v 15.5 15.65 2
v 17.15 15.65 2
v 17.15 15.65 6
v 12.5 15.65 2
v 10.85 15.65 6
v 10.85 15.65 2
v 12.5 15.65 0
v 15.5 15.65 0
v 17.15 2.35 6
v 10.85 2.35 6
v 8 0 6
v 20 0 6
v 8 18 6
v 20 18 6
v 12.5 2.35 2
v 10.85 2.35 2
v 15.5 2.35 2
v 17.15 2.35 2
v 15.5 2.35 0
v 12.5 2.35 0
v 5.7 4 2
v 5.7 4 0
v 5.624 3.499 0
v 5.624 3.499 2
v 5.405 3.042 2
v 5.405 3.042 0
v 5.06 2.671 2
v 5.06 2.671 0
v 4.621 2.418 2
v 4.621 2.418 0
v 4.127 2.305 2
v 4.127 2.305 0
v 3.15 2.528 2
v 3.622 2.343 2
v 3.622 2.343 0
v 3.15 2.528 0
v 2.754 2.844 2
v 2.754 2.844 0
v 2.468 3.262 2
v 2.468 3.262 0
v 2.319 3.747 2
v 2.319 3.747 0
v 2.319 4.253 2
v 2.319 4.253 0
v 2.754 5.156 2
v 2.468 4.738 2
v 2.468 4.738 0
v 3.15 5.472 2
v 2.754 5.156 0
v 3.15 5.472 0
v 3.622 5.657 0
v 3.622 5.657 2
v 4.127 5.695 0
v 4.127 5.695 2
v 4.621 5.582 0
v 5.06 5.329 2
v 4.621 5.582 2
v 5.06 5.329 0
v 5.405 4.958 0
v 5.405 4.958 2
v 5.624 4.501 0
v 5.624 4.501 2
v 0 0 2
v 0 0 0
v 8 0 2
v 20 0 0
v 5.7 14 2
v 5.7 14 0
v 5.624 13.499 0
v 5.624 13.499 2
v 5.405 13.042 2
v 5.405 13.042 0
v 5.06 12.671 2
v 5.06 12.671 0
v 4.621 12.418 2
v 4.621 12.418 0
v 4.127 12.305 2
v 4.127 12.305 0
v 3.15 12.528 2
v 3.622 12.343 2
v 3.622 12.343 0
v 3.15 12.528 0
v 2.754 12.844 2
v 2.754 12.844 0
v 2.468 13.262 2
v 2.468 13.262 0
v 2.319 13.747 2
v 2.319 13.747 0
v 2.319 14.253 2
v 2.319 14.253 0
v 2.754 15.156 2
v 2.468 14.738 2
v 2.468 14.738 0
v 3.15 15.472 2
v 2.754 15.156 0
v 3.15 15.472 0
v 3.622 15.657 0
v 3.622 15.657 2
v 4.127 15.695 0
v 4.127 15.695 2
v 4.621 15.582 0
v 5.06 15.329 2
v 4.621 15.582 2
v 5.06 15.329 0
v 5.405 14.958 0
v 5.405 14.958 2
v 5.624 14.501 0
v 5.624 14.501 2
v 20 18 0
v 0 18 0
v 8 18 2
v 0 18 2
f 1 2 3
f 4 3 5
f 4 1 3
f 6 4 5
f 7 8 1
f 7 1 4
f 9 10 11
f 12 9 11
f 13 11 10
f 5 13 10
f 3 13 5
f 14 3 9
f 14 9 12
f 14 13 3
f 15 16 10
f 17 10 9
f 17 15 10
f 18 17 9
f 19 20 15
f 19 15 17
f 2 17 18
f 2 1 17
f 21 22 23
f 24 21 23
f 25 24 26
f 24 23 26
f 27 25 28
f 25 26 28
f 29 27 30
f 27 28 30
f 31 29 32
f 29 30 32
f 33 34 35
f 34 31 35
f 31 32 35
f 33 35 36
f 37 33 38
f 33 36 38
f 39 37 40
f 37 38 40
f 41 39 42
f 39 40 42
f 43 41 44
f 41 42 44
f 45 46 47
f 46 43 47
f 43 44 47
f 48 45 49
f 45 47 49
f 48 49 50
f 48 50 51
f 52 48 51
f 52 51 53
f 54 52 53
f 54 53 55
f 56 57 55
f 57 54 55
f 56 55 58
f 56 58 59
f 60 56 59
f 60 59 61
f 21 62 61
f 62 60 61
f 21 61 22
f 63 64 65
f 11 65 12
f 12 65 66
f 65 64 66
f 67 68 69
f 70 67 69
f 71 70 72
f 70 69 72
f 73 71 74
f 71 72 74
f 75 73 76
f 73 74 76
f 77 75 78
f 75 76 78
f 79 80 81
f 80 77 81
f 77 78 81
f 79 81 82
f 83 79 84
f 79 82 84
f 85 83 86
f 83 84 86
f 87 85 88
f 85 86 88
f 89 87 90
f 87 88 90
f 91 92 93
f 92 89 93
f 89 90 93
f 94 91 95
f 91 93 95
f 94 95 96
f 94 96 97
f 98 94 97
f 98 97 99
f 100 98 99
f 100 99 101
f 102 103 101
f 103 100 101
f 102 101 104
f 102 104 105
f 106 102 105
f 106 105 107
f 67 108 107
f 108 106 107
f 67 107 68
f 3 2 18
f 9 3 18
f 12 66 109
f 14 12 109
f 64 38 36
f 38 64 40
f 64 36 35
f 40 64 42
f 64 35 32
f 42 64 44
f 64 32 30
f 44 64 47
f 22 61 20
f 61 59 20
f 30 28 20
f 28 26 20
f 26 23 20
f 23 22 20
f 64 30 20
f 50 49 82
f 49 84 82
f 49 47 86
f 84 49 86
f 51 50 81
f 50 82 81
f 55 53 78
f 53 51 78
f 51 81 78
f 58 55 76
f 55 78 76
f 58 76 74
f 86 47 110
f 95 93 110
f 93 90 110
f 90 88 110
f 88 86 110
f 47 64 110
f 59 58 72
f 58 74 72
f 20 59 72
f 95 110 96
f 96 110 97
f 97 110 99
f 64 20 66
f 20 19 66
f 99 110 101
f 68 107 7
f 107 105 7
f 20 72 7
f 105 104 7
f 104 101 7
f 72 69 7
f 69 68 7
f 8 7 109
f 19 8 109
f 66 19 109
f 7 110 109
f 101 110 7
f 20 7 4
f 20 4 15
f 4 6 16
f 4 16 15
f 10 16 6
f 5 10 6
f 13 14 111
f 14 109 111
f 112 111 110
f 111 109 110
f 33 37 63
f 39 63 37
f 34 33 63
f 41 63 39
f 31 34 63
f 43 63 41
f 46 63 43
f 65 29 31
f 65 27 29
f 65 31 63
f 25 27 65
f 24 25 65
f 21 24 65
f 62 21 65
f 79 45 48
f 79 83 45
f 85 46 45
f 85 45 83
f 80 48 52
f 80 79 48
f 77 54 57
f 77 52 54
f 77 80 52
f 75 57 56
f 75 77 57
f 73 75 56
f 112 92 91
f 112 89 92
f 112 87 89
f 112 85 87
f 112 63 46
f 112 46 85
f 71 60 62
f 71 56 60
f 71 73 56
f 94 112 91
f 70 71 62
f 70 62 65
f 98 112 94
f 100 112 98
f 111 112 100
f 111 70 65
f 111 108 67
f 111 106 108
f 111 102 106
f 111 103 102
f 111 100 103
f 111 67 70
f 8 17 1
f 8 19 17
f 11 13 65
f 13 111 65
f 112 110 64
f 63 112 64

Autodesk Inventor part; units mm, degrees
ref_plane "YZ Plane" through (0, 0, 0) normal (1, 0, 0) x (0, 1, 0)
ref_plane "XZ Plane" through (0, 0, 0) normal (0, 1, 0) x (-1, 0, 0)
ref_plane "XY Plane" through (0, 0, 0) normal (0, 0, 1) x (1, 0, 0)
sketch "Sketch1" plane through (0, 0, 0) normal (0, 0, 1) x (1, 0, 0)
  line L0 (0, 0) -> (20, 0)
  line L1 (20, 0) -> (20, 18)
  line L2 (20, 18) -> (0, 18)
  line L3 (0, 18) -> (0, 0)
  line L4 (12.5, 2.35) -> (15.5, 2.35)
  line L5 (15.5, 2.35) -> (15.5, 15.65)
  line L6 (15.5, 15.65) -> (12.5, 15.65)
  line L7 (12.5, 15.65) -> (12.5, 2.35)
  circle A0 centre (4, 14) radius 1.7
  circle A1 centre (4, 4) radius 1.7
  line L8 (20, 18) -> (8, 18)
  line L9 (8, 18) -> (8, 0)
  line L10 (8, 0) -> (20, 0)
  line L11 (20, 0) -> (20, 18)
  line L12 (10.85, 15.65) -> (17.15, 15.65)
  line L13 (17.15, 15.65) -> (17.15, 2.35)
  line L14 (17.15, 2.35) -> (10.85, 2.35)
  line L15 (10.85, 2.35) -> (10.85, 15.65)
  point P0 (15.5, 9)
  point P1 (20, 9)
  point P2 (14, 15.65)
  point P3 (14, 18)
  point P4 (17.15, 9)
  point P5 (20, 9)
  point P6 (14, 15.65)
  dimension "d0" = 20
  dimension "d1" = 18
  dimension "d3" = 3
  dimension "d5" = 3.4
  dimension "d6" = 3.4
  dimension "d7" = 4
  dimension "d8" = 4
  dimension "d9" = 10
  dimension "d20" = 12
  dimension "d21" = 6.3
  dimension "d22" = 13.3
extrude "Extrusion1" add sketch "Sketch1" along normal blind 2 contours L3 L2 L9 L0 | L9 L2 L1 L0 | L14 L15 L12 L7 | L5 L12 L13 L14
extrude "Extrusion3" add sketch "Sketch1" along normal blind 6 contours L9 L2 L1 L0
properties part number "switch lever 2"
